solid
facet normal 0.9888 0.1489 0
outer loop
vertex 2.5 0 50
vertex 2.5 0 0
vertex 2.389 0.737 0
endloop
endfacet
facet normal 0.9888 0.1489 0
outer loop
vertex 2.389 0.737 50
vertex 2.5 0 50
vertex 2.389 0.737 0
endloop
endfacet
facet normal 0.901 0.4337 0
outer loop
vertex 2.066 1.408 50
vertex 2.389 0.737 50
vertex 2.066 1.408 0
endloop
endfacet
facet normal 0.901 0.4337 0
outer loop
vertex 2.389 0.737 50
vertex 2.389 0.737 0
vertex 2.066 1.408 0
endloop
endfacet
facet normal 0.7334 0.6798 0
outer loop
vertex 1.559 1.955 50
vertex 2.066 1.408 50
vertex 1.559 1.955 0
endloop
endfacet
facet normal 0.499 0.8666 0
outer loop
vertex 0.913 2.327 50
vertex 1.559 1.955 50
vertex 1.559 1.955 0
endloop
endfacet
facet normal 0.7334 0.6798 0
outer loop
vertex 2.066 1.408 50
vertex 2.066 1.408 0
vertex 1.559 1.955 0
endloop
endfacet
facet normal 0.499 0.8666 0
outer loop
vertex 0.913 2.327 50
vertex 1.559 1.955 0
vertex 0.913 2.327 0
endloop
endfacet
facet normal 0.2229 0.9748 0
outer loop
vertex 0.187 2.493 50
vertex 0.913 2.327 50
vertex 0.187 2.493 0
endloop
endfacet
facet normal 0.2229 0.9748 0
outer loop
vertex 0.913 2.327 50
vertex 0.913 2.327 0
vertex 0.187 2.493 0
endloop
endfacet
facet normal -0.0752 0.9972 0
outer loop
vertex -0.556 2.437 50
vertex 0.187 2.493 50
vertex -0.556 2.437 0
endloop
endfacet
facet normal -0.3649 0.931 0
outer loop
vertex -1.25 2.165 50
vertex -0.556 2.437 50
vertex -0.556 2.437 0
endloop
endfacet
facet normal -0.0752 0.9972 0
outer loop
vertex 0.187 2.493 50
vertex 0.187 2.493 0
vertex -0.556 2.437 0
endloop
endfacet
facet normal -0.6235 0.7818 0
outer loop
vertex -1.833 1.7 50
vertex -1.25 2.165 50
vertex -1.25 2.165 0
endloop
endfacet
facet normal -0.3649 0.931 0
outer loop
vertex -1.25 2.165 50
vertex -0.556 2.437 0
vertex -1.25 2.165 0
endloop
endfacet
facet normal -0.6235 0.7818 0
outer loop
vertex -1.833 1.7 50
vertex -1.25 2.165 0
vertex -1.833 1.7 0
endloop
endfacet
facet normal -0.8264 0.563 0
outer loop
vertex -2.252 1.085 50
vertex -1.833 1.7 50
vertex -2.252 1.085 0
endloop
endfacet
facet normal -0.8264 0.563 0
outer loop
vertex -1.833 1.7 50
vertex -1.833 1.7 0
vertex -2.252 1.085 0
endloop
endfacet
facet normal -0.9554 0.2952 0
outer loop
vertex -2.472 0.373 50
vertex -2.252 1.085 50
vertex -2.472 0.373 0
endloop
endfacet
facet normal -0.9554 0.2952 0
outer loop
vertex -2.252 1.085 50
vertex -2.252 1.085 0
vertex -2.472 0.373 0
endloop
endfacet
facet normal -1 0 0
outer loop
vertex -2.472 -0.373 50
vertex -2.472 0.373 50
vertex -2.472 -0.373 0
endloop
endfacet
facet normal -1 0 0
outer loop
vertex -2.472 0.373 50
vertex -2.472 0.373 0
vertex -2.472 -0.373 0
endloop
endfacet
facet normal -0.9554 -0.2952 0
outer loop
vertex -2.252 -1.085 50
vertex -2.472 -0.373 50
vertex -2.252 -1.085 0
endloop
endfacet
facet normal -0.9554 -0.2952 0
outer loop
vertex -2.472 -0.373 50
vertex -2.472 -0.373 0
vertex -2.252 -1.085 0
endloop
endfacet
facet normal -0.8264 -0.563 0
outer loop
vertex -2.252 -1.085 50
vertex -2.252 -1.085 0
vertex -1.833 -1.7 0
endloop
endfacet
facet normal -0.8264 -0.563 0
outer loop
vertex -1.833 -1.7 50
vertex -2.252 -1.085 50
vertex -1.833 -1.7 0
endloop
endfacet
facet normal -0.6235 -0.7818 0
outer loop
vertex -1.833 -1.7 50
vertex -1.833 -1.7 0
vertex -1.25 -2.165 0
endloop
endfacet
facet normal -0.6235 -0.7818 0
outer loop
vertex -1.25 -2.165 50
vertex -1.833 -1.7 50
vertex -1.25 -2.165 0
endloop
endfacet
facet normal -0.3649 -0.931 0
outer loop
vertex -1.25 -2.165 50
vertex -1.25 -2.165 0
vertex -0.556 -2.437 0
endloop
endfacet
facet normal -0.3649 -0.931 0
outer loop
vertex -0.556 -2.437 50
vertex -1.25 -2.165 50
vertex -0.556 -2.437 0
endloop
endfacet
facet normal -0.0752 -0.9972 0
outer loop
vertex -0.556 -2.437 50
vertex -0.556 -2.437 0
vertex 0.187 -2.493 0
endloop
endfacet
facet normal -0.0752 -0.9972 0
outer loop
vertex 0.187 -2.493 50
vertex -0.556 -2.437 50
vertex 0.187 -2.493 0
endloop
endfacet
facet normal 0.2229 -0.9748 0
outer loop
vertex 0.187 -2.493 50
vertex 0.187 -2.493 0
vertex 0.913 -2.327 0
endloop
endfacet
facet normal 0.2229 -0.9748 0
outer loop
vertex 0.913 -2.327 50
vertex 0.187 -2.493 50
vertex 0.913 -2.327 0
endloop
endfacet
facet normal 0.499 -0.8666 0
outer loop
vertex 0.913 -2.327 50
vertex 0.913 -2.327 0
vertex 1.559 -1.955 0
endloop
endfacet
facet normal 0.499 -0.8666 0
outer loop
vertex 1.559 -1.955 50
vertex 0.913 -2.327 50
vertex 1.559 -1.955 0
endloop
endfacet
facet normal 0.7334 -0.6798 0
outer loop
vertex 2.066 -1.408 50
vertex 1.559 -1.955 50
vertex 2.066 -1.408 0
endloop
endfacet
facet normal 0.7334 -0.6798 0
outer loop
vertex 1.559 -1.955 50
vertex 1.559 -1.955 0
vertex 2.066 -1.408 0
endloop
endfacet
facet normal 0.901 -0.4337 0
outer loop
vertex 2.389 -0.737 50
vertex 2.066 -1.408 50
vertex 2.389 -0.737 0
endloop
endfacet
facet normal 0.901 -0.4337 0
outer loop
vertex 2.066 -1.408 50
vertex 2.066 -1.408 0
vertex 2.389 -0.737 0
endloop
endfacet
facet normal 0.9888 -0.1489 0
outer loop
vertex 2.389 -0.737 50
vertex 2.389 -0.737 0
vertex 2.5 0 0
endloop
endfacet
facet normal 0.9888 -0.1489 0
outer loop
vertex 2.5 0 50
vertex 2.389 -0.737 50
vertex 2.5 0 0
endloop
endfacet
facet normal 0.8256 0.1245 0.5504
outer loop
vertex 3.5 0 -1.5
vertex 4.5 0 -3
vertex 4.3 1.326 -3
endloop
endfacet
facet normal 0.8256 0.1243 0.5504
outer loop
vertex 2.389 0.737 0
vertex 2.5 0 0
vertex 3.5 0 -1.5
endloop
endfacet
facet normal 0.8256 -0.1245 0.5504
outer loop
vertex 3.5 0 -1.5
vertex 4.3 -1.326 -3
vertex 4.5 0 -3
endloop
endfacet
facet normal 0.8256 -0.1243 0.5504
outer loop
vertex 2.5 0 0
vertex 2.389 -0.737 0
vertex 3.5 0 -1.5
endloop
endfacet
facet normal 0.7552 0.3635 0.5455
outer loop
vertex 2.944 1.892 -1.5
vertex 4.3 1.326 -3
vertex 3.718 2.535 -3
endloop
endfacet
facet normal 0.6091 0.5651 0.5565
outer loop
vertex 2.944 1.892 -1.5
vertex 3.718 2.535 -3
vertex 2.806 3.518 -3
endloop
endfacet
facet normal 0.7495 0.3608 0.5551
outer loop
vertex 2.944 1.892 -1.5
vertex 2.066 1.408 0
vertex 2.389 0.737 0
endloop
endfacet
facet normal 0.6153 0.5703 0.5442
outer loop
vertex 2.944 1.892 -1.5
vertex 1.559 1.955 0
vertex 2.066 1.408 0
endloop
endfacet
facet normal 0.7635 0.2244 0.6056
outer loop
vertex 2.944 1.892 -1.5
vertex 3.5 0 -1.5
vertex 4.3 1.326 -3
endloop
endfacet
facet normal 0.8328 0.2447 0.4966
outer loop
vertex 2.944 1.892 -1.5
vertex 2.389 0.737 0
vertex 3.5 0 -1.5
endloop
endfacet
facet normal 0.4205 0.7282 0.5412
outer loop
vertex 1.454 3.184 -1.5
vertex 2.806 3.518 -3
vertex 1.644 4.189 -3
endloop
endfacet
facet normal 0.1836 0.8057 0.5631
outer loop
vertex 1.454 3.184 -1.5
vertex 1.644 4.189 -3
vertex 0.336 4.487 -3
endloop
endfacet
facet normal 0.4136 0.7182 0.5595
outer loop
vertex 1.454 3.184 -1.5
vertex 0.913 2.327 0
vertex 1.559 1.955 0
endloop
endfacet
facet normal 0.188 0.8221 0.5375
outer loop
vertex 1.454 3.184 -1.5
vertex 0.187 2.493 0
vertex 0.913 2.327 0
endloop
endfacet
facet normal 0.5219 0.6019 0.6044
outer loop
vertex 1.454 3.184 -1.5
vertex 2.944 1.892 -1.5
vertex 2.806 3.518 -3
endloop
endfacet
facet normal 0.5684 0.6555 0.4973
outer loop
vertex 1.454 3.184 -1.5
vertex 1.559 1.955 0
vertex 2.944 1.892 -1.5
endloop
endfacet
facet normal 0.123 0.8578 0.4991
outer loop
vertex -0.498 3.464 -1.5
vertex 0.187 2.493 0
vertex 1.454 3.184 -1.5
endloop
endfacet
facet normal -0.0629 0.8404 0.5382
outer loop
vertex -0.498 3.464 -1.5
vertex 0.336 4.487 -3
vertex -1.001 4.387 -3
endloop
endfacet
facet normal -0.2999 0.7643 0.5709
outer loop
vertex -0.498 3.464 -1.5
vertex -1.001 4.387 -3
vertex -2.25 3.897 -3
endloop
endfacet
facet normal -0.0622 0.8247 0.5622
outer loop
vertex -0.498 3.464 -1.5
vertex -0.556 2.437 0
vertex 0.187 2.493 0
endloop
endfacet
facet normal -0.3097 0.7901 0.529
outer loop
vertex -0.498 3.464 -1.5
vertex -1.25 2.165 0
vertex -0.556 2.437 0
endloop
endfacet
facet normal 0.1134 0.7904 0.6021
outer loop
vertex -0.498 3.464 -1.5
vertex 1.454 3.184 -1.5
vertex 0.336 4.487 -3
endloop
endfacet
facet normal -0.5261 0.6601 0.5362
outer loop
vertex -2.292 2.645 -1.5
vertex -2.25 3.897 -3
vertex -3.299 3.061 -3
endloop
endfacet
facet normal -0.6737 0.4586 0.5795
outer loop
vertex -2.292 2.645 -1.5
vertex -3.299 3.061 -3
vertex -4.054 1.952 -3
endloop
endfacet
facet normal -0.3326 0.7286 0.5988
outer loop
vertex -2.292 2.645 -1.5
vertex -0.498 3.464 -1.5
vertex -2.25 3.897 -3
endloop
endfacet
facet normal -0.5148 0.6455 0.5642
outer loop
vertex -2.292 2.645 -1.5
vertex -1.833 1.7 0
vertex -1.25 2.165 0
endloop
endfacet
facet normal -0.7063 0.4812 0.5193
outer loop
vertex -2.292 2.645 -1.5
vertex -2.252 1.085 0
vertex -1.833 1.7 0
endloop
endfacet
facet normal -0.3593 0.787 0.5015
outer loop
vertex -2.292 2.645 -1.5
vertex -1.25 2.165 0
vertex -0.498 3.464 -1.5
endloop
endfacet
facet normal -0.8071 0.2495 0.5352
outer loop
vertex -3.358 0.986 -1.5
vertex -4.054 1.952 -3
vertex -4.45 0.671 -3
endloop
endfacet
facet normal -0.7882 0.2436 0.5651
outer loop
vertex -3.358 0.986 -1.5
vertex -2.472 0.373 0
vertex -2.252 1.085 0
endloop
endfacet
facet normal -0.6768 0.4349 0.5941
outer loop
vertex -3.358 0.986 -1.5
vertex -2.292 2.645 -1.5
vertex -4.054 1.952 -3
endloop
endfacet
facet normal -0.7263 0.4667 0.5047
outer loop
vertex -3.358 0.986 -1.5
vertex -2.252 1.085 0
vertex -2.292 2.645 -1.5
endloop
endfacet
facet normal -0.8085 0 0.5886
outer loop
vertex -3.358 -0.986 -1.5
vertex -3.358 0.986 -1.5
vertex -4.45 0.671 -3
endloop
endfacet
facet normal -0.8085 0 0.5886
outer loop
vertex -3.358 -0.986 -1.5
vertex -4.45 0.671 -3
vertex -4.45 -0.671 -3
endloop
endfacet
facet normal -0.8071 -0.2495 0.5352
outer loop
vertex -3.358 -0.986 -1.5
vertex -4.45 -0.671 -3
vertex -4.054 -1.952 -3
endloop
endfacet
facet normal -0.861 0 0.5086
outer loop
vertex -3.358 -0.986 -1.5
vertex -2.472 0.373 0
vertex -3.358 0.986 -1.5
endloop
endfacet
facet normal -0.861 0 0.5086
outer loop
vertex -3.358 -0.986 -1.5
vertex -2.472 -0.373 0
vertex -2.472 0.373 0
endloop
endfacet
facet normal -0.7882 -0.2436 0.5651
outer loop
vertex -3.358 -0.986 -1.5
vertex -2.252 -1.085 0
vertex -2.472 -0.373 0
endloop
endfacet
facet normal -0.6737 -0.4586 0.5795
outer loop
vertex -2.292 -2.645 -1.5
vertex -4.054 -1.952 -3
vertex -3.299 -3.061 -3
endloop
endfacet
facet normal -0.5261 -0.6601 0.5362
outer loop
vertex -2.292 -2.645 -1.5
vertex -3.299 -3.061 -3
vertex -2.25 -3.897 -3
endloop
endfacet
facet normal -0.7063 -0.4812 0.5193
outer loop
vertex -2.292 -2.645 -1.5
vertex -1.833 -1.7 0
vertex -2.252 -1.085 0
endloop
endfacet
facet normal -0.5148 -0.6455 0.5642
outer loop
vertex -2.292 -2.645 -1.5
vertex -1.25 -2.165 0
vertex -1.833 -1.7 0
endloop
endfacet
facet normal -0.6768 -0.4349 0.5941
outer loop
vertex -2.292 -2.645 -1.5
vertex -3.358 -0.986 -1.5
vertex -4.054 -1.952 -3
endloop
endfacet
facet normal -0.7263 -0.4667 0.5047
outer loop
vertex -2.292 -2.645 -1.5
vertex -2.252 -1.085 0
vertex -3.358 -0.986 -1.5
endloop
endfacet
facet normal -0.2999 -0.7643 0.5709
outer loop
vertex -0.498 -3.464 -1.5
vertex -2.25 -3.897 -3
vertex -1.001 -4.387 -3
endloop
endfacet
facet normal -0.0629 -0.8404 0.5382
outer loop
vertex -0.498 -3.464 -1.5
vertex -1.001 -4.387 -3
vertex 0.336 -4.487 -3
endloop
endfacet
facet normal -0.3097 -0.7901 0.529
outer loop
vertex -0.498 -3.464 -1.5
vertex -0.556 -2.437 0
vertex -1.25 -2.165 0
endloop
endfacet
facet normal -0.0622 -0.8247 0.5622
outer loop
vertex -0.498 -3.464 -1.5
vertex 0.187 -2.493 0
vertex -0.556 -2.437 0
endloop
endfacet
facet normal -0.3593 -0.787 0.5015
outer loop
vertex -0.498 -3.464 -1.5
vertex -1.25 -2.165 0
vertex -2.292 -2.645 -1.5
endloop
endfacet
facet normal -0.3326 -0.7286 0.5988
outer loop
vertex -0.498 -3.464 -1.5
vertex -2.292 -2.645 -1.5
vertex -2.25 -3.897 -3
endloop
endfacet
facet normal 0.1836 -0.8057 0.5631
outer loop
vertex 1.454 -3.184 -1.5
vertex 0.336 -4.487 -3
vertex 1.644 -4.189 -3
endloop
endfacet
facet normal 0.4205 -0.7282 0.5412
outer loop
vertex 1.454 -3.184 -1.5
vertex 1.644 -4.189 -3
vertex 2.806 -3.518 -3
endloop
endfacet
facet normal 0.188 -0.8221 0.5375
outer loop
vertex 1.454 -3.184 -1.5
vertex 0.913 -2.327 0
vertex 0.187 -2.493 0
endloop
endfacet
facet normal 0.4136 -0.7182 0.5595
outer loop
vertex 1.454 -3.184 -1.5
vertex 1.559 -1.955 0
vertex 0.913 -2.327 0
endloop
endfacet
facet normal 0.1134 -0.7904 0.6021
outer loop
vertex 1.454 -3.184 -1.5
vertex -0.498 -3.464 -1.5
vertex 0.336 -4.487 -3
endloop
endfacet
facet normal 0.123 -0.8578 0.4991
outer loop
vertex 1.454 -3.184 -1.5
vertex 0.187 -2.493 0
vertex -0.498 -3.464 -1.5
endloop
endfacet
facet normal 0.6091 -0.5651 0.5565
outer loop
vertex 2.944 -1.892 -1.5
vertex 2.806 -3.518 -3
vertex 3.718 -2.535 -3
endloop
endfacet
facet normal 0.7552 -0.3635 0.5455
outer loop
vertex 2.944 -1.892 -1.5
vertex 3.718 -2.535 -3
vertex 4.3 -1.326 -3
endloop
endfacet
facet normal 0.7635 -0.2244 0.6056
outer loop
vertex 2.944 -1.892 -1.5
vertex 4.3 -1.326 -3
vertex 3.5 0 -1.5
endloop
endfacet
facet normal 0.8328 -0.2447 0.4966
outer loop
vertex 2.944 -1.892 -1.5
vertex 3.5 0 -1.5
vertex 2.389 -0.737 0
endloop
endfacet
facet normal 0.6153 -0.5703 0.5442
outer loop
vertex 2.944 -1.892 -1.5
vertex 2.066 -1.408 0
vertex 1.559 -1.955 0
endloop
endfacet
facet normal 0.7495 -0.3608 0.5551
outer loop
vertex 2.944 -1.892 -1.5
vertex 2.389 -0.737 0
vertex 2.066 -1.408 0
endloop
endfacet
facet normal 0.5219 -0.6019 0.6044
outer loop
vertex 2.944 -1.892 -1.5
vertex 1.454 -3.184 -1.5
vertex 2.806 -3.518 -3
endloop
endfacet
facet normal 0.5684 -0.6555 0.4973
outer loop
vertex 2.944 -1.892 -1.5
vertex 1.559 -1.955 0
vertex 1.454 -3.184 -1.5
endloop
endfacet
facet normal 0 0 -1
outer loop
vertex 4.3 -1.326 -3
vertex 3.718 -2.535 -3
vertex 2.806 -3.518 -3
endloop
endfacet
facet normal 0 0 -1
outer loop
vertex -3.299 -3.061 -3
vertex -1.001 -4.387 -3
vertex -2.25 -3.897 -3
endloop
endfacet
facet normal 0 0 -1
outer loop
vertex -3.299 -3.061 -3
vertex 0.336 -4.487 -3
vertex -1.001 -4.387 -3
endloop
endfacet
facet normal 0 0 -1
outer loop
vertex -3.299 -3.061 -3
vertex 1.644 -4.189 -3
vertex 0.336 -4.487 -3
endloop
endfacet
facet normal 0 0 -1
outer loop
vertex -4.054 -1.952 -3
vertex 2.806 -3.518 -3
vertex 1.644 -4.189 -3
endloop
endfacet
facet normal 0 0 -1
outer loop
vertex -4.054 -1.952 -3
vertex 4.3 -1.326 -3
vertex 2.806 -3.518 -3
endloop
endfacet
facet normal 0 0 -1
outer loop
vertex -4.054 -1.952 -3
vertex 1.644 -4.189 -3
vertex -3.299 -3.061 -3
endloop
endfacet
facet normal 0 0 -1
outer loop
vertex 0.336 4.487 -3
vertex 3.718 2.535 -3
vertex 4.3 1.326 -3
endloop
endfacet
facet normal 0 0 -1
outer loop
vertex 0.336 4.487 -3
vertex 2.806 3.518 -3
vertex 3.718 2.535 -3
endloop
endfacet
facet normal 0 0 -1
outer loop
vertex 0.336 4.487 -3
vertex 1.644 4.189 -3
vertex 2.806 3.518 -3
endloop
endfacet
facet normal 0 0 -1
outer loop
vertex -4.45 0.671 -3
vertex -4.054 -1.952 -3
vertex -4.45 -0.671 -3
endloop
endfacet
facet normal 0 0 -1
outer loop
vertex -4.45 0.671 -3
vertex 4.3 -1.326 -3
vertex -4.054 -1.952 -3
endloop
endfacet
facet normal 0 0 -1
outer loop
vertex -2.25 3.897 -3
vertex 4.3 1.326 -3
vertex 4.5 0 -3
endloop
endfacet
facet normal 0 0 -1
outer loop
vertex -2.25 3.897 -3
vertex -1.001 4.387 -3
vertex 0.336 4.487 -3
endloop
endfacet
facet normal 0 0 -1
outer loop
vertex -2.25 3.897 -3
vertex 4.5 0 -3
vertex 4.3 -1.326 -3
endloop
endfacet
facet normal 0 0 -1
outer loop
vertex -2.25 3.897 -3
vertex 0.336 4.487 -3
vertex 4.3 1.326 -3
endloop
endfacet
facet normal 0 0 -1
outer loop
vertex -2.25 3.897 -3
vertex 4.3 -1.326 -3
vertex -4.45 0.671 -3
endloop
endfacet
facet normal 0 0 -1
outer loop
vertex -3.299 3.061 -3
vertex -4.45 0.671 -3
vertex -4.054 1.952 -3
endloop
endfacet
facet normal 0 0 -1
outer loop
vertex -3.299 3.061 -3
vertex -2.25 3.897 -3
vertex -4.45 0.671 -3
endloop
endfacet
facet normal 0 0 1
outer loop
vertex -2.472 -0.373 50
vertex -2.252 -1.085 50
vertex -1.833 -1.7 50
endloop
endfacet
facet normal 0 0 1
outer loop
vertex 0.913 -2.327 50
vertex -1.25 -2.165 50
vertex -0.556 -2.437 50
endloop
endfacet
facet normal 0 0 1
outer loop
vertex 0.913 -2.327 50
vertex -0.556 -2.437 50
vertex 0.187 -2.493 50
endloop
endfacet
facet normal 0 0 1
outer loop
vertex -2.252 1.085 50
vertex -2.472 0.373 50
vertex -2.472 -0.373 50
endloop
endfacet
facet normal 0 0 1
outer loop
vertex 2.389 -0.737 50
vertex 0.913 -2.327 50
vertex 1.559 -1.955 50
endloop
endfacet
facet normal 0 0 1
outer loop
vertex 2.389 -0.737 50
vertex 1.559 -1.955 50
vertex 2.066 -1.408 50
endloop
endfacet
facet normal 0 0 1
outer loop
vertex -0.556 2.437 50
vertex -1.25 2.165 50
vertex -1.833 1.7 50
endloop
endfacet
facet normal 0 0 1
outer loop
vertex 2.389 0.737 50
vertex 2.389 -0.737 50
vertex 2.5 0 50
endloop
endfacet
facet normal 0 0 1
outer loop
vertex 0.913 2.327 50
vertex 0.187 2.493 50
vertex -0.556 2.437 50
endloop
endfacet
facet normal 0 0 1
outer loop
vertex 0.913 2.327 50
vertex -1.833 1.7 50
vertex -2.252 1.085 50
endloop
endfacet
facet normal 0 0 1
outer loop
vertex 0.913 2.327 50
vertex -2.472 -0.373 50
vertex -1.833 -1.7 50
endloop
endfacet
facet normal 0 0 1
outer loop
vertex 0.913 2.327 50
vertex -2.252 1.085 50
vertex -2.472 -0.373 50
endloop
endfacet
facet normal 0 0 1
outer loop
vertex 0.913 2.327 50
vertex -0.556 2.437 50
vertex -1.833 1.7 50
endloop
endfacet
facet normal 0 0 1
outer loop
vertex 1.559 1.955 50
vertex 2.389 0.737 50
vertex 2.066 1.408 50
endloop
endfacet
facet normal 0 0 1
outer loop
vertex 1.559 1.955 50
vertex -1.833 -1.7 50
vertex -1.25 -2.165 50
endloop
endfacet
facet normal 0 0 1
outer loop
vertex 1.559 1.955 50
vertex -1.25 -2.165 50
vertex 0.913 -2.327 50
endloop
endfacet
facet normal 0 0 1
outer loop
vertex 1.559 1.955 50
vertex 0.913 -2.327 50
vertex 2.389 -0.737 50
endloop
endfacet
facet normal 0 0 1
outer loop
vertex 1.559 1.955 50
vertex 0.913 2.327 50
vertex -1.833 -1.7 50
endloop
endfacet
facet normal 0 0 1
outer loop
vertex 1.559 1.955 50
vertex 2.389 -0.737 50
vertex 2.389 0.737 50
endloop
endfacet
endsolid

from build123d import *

# Parameters (mm, degrees)
CYLINDER_R     = 2.5
CYLINDER_DEPTH = 50


with BuildPart() as cone:
    # Cone → Cone (revolve)
    with BuildSketch(Plane(origin=(0, 0, -3), x_dir=(1, 0, 0), z_dir=(0, -1, 0))):
        Polygon((0, 0), (4.5, 0), (2.5, 3), (0, 3), align=None)
    revolve(axis=Axis((0, 0, -3), (0, 0, 1)))


with BuildPart() as m5x50_senkkopf:
    # Cylinder → Cylinder (new body)
    with BuildSketch(Plane.XY):
        Circle(CYLINDER_R)
    extrude(amount=CYLINDER_DEPTH)

    # Fusion: union Cone
    add(cone.part)


solid = m5x50_senkkopf.part
